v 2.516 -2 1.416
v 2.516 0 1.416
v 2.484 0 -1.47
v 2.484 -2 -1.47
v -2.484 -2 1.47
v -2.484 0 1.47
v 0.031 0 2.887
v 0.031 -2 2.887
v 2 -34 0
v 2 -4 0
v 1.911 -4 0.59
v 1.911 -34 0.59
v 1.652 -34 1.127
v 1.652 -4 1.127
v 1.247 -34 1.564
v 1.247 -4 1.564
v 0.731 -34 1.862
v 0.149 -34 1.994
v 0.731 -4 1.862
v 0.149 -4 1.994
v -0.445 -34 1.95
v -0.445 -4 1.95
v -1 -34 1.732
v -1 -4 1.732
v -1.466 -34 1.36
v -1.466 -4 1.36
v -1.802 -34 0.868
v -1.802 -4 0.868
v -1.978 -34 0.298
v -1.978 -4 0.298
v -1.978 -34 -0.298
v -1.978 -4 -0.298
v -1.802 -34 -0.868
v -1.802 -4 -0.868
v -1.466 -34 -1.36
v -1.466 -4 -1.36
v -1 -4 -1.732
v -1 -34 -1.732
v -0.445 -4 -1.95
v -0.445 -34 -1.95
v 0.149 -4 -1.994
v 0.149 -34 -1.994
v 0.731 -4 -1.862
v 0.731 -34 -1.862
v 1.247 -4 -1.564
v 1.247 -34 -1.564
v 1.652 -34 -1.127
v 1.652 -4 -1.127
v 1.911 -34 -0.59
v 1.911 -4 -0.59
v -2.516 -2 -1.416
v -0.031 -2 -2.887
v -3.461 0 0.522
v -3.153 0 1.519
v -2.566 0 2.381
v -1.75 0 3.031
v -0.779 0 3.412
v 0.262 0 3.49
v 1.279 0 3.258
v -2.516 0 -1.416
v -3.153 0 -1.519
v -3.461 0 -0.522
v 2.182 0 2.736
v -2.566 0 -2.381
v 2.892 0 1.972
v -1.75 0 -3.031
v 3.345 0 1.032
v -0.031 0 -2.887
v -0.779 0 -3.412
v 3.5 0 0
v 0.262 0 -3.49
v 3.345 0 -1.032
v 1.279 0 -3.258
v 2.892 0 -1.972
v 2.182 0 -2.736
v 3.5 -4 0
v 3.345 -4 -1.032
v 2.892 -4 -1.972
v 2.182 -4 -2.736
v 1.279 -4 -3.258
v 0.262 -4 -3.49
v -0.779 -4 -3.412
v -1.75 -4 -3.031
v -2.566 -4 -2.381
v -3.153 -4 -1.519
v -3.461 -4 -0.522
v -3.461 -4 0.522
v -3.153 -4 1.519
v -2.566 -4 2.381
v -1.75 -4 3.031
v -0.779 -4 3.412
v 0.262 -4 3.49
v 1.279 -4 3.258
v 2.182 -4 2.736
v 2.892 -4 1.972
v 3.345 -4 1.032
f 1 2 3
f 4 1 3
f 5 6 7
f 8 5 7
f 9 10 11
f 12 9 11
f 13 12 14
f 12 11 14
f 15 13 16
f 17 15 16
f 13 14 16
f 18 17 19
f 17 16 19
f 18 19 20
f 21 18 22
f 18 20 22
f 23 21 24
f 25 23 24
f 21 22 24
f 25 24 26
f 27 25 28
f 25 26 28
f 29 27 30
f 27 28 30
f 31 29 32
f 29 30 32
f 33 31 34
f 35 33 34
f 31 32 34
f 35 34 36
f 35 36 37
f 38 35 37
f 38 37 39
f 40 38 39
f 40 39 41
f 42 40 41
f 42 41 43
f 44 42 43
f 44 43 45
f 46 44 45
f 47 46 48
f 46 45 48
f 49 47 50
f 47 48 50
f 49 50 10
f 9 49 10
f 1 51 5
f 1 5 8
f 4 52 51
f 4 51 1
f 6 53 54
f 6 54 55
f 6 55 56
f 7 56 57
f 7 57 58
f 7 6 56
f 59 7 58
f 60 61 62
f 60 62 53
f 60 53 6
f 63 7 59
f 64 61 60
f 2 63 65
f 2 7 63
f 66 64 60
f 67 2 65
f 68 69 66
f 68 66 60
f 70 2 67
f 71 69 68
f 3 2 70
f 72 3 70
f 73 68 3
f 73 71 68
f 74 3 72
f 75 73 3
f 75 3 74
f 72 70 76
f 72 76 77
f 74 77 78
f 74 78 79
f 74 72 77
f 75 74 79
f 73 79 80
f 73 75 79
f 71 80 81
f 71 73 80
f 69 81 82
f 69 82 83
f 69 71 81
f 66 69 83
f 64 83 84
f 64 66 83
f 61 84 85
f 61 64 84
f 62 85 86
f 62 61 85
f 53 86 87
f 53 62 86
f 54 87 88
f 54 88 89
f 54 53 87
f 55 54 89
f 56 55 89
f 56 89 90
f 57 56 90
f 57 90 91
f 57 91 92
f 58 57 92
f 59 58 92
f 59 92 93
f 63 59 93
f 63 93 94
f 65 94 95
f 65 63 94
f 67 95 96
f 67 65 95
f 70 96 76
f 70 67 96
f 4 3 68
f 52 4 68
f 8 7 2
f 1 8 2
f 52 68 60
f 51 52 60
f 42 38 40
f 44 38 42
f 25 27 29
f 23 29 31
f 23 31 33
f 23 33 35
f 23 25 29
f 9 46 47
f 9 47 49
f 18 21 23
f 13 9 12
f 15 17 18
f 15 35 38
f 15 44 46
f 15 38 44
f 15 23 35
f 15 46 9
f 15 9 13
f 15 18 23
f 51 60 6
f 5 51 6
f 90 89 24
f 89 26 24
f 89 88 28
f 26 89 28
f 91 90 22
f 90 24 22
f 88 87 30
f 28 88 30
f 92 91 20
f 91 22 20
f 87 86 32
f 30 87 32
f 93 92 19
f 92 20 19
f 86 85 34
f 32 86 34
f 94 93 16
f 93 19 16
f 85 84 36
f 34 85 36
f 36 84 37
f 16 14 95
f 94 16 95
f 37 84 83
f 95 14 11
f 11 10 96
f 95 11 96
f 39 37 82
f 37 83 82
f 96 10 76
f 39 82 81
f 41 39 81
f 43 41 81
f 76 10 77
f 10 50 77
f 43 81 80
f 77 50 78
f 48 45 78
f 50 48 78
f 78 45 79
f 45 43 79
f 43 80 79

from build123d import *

# Parameters (mm, degrees)
SKETCH_1_R          = 3.5
EXTRUDE_1_DEPTH     = 4
SKETCH_2_R          = 2
EXTRUDE_2_DEPTH     = 30
CUT_EXTRUDE_1_DEPTH = 2


with BuildPart() as part:
    # 草图1 → 凸台-拉伸1 (new body)
    with BuildSketch(Plane(origin=(0, 0, 0), x_dir=(1, 0, 0), z_dir=(0, 1, 0))):
        Circle(SKETCH_1_R)
    extrude(amount=-EXTRUDE_1_DEPTH)

    # 草图2 → 凸台-拉伸2 (add)
    with BuildSketch(Plane.XZ.offset(4)):
        Circle(SKETCH_2_R)
    extrude(amount=EXTRUDE_2_DEPTH)

    # 草图3 → 切除-拉伸1 (cut)
    with BuildSketch(Plane(origin=(0, 0, 0), x_dir=(1, 0, 0), z_dir=(0, 1, 0))):
        Polygon((2.51555192, -1.416097409), (2.484152291, 1.470483162), (-0.031399629, 2.886580572), (-2.51555192, 1.416097409), (-2.484152291, -1.470483162), (0.031399629, -2.886580572), align=None)
    extrude(amount=-CUT_EXTRUDE_1_DEPTH, mode=Mode.SUBTRACT)


solid = part.part
